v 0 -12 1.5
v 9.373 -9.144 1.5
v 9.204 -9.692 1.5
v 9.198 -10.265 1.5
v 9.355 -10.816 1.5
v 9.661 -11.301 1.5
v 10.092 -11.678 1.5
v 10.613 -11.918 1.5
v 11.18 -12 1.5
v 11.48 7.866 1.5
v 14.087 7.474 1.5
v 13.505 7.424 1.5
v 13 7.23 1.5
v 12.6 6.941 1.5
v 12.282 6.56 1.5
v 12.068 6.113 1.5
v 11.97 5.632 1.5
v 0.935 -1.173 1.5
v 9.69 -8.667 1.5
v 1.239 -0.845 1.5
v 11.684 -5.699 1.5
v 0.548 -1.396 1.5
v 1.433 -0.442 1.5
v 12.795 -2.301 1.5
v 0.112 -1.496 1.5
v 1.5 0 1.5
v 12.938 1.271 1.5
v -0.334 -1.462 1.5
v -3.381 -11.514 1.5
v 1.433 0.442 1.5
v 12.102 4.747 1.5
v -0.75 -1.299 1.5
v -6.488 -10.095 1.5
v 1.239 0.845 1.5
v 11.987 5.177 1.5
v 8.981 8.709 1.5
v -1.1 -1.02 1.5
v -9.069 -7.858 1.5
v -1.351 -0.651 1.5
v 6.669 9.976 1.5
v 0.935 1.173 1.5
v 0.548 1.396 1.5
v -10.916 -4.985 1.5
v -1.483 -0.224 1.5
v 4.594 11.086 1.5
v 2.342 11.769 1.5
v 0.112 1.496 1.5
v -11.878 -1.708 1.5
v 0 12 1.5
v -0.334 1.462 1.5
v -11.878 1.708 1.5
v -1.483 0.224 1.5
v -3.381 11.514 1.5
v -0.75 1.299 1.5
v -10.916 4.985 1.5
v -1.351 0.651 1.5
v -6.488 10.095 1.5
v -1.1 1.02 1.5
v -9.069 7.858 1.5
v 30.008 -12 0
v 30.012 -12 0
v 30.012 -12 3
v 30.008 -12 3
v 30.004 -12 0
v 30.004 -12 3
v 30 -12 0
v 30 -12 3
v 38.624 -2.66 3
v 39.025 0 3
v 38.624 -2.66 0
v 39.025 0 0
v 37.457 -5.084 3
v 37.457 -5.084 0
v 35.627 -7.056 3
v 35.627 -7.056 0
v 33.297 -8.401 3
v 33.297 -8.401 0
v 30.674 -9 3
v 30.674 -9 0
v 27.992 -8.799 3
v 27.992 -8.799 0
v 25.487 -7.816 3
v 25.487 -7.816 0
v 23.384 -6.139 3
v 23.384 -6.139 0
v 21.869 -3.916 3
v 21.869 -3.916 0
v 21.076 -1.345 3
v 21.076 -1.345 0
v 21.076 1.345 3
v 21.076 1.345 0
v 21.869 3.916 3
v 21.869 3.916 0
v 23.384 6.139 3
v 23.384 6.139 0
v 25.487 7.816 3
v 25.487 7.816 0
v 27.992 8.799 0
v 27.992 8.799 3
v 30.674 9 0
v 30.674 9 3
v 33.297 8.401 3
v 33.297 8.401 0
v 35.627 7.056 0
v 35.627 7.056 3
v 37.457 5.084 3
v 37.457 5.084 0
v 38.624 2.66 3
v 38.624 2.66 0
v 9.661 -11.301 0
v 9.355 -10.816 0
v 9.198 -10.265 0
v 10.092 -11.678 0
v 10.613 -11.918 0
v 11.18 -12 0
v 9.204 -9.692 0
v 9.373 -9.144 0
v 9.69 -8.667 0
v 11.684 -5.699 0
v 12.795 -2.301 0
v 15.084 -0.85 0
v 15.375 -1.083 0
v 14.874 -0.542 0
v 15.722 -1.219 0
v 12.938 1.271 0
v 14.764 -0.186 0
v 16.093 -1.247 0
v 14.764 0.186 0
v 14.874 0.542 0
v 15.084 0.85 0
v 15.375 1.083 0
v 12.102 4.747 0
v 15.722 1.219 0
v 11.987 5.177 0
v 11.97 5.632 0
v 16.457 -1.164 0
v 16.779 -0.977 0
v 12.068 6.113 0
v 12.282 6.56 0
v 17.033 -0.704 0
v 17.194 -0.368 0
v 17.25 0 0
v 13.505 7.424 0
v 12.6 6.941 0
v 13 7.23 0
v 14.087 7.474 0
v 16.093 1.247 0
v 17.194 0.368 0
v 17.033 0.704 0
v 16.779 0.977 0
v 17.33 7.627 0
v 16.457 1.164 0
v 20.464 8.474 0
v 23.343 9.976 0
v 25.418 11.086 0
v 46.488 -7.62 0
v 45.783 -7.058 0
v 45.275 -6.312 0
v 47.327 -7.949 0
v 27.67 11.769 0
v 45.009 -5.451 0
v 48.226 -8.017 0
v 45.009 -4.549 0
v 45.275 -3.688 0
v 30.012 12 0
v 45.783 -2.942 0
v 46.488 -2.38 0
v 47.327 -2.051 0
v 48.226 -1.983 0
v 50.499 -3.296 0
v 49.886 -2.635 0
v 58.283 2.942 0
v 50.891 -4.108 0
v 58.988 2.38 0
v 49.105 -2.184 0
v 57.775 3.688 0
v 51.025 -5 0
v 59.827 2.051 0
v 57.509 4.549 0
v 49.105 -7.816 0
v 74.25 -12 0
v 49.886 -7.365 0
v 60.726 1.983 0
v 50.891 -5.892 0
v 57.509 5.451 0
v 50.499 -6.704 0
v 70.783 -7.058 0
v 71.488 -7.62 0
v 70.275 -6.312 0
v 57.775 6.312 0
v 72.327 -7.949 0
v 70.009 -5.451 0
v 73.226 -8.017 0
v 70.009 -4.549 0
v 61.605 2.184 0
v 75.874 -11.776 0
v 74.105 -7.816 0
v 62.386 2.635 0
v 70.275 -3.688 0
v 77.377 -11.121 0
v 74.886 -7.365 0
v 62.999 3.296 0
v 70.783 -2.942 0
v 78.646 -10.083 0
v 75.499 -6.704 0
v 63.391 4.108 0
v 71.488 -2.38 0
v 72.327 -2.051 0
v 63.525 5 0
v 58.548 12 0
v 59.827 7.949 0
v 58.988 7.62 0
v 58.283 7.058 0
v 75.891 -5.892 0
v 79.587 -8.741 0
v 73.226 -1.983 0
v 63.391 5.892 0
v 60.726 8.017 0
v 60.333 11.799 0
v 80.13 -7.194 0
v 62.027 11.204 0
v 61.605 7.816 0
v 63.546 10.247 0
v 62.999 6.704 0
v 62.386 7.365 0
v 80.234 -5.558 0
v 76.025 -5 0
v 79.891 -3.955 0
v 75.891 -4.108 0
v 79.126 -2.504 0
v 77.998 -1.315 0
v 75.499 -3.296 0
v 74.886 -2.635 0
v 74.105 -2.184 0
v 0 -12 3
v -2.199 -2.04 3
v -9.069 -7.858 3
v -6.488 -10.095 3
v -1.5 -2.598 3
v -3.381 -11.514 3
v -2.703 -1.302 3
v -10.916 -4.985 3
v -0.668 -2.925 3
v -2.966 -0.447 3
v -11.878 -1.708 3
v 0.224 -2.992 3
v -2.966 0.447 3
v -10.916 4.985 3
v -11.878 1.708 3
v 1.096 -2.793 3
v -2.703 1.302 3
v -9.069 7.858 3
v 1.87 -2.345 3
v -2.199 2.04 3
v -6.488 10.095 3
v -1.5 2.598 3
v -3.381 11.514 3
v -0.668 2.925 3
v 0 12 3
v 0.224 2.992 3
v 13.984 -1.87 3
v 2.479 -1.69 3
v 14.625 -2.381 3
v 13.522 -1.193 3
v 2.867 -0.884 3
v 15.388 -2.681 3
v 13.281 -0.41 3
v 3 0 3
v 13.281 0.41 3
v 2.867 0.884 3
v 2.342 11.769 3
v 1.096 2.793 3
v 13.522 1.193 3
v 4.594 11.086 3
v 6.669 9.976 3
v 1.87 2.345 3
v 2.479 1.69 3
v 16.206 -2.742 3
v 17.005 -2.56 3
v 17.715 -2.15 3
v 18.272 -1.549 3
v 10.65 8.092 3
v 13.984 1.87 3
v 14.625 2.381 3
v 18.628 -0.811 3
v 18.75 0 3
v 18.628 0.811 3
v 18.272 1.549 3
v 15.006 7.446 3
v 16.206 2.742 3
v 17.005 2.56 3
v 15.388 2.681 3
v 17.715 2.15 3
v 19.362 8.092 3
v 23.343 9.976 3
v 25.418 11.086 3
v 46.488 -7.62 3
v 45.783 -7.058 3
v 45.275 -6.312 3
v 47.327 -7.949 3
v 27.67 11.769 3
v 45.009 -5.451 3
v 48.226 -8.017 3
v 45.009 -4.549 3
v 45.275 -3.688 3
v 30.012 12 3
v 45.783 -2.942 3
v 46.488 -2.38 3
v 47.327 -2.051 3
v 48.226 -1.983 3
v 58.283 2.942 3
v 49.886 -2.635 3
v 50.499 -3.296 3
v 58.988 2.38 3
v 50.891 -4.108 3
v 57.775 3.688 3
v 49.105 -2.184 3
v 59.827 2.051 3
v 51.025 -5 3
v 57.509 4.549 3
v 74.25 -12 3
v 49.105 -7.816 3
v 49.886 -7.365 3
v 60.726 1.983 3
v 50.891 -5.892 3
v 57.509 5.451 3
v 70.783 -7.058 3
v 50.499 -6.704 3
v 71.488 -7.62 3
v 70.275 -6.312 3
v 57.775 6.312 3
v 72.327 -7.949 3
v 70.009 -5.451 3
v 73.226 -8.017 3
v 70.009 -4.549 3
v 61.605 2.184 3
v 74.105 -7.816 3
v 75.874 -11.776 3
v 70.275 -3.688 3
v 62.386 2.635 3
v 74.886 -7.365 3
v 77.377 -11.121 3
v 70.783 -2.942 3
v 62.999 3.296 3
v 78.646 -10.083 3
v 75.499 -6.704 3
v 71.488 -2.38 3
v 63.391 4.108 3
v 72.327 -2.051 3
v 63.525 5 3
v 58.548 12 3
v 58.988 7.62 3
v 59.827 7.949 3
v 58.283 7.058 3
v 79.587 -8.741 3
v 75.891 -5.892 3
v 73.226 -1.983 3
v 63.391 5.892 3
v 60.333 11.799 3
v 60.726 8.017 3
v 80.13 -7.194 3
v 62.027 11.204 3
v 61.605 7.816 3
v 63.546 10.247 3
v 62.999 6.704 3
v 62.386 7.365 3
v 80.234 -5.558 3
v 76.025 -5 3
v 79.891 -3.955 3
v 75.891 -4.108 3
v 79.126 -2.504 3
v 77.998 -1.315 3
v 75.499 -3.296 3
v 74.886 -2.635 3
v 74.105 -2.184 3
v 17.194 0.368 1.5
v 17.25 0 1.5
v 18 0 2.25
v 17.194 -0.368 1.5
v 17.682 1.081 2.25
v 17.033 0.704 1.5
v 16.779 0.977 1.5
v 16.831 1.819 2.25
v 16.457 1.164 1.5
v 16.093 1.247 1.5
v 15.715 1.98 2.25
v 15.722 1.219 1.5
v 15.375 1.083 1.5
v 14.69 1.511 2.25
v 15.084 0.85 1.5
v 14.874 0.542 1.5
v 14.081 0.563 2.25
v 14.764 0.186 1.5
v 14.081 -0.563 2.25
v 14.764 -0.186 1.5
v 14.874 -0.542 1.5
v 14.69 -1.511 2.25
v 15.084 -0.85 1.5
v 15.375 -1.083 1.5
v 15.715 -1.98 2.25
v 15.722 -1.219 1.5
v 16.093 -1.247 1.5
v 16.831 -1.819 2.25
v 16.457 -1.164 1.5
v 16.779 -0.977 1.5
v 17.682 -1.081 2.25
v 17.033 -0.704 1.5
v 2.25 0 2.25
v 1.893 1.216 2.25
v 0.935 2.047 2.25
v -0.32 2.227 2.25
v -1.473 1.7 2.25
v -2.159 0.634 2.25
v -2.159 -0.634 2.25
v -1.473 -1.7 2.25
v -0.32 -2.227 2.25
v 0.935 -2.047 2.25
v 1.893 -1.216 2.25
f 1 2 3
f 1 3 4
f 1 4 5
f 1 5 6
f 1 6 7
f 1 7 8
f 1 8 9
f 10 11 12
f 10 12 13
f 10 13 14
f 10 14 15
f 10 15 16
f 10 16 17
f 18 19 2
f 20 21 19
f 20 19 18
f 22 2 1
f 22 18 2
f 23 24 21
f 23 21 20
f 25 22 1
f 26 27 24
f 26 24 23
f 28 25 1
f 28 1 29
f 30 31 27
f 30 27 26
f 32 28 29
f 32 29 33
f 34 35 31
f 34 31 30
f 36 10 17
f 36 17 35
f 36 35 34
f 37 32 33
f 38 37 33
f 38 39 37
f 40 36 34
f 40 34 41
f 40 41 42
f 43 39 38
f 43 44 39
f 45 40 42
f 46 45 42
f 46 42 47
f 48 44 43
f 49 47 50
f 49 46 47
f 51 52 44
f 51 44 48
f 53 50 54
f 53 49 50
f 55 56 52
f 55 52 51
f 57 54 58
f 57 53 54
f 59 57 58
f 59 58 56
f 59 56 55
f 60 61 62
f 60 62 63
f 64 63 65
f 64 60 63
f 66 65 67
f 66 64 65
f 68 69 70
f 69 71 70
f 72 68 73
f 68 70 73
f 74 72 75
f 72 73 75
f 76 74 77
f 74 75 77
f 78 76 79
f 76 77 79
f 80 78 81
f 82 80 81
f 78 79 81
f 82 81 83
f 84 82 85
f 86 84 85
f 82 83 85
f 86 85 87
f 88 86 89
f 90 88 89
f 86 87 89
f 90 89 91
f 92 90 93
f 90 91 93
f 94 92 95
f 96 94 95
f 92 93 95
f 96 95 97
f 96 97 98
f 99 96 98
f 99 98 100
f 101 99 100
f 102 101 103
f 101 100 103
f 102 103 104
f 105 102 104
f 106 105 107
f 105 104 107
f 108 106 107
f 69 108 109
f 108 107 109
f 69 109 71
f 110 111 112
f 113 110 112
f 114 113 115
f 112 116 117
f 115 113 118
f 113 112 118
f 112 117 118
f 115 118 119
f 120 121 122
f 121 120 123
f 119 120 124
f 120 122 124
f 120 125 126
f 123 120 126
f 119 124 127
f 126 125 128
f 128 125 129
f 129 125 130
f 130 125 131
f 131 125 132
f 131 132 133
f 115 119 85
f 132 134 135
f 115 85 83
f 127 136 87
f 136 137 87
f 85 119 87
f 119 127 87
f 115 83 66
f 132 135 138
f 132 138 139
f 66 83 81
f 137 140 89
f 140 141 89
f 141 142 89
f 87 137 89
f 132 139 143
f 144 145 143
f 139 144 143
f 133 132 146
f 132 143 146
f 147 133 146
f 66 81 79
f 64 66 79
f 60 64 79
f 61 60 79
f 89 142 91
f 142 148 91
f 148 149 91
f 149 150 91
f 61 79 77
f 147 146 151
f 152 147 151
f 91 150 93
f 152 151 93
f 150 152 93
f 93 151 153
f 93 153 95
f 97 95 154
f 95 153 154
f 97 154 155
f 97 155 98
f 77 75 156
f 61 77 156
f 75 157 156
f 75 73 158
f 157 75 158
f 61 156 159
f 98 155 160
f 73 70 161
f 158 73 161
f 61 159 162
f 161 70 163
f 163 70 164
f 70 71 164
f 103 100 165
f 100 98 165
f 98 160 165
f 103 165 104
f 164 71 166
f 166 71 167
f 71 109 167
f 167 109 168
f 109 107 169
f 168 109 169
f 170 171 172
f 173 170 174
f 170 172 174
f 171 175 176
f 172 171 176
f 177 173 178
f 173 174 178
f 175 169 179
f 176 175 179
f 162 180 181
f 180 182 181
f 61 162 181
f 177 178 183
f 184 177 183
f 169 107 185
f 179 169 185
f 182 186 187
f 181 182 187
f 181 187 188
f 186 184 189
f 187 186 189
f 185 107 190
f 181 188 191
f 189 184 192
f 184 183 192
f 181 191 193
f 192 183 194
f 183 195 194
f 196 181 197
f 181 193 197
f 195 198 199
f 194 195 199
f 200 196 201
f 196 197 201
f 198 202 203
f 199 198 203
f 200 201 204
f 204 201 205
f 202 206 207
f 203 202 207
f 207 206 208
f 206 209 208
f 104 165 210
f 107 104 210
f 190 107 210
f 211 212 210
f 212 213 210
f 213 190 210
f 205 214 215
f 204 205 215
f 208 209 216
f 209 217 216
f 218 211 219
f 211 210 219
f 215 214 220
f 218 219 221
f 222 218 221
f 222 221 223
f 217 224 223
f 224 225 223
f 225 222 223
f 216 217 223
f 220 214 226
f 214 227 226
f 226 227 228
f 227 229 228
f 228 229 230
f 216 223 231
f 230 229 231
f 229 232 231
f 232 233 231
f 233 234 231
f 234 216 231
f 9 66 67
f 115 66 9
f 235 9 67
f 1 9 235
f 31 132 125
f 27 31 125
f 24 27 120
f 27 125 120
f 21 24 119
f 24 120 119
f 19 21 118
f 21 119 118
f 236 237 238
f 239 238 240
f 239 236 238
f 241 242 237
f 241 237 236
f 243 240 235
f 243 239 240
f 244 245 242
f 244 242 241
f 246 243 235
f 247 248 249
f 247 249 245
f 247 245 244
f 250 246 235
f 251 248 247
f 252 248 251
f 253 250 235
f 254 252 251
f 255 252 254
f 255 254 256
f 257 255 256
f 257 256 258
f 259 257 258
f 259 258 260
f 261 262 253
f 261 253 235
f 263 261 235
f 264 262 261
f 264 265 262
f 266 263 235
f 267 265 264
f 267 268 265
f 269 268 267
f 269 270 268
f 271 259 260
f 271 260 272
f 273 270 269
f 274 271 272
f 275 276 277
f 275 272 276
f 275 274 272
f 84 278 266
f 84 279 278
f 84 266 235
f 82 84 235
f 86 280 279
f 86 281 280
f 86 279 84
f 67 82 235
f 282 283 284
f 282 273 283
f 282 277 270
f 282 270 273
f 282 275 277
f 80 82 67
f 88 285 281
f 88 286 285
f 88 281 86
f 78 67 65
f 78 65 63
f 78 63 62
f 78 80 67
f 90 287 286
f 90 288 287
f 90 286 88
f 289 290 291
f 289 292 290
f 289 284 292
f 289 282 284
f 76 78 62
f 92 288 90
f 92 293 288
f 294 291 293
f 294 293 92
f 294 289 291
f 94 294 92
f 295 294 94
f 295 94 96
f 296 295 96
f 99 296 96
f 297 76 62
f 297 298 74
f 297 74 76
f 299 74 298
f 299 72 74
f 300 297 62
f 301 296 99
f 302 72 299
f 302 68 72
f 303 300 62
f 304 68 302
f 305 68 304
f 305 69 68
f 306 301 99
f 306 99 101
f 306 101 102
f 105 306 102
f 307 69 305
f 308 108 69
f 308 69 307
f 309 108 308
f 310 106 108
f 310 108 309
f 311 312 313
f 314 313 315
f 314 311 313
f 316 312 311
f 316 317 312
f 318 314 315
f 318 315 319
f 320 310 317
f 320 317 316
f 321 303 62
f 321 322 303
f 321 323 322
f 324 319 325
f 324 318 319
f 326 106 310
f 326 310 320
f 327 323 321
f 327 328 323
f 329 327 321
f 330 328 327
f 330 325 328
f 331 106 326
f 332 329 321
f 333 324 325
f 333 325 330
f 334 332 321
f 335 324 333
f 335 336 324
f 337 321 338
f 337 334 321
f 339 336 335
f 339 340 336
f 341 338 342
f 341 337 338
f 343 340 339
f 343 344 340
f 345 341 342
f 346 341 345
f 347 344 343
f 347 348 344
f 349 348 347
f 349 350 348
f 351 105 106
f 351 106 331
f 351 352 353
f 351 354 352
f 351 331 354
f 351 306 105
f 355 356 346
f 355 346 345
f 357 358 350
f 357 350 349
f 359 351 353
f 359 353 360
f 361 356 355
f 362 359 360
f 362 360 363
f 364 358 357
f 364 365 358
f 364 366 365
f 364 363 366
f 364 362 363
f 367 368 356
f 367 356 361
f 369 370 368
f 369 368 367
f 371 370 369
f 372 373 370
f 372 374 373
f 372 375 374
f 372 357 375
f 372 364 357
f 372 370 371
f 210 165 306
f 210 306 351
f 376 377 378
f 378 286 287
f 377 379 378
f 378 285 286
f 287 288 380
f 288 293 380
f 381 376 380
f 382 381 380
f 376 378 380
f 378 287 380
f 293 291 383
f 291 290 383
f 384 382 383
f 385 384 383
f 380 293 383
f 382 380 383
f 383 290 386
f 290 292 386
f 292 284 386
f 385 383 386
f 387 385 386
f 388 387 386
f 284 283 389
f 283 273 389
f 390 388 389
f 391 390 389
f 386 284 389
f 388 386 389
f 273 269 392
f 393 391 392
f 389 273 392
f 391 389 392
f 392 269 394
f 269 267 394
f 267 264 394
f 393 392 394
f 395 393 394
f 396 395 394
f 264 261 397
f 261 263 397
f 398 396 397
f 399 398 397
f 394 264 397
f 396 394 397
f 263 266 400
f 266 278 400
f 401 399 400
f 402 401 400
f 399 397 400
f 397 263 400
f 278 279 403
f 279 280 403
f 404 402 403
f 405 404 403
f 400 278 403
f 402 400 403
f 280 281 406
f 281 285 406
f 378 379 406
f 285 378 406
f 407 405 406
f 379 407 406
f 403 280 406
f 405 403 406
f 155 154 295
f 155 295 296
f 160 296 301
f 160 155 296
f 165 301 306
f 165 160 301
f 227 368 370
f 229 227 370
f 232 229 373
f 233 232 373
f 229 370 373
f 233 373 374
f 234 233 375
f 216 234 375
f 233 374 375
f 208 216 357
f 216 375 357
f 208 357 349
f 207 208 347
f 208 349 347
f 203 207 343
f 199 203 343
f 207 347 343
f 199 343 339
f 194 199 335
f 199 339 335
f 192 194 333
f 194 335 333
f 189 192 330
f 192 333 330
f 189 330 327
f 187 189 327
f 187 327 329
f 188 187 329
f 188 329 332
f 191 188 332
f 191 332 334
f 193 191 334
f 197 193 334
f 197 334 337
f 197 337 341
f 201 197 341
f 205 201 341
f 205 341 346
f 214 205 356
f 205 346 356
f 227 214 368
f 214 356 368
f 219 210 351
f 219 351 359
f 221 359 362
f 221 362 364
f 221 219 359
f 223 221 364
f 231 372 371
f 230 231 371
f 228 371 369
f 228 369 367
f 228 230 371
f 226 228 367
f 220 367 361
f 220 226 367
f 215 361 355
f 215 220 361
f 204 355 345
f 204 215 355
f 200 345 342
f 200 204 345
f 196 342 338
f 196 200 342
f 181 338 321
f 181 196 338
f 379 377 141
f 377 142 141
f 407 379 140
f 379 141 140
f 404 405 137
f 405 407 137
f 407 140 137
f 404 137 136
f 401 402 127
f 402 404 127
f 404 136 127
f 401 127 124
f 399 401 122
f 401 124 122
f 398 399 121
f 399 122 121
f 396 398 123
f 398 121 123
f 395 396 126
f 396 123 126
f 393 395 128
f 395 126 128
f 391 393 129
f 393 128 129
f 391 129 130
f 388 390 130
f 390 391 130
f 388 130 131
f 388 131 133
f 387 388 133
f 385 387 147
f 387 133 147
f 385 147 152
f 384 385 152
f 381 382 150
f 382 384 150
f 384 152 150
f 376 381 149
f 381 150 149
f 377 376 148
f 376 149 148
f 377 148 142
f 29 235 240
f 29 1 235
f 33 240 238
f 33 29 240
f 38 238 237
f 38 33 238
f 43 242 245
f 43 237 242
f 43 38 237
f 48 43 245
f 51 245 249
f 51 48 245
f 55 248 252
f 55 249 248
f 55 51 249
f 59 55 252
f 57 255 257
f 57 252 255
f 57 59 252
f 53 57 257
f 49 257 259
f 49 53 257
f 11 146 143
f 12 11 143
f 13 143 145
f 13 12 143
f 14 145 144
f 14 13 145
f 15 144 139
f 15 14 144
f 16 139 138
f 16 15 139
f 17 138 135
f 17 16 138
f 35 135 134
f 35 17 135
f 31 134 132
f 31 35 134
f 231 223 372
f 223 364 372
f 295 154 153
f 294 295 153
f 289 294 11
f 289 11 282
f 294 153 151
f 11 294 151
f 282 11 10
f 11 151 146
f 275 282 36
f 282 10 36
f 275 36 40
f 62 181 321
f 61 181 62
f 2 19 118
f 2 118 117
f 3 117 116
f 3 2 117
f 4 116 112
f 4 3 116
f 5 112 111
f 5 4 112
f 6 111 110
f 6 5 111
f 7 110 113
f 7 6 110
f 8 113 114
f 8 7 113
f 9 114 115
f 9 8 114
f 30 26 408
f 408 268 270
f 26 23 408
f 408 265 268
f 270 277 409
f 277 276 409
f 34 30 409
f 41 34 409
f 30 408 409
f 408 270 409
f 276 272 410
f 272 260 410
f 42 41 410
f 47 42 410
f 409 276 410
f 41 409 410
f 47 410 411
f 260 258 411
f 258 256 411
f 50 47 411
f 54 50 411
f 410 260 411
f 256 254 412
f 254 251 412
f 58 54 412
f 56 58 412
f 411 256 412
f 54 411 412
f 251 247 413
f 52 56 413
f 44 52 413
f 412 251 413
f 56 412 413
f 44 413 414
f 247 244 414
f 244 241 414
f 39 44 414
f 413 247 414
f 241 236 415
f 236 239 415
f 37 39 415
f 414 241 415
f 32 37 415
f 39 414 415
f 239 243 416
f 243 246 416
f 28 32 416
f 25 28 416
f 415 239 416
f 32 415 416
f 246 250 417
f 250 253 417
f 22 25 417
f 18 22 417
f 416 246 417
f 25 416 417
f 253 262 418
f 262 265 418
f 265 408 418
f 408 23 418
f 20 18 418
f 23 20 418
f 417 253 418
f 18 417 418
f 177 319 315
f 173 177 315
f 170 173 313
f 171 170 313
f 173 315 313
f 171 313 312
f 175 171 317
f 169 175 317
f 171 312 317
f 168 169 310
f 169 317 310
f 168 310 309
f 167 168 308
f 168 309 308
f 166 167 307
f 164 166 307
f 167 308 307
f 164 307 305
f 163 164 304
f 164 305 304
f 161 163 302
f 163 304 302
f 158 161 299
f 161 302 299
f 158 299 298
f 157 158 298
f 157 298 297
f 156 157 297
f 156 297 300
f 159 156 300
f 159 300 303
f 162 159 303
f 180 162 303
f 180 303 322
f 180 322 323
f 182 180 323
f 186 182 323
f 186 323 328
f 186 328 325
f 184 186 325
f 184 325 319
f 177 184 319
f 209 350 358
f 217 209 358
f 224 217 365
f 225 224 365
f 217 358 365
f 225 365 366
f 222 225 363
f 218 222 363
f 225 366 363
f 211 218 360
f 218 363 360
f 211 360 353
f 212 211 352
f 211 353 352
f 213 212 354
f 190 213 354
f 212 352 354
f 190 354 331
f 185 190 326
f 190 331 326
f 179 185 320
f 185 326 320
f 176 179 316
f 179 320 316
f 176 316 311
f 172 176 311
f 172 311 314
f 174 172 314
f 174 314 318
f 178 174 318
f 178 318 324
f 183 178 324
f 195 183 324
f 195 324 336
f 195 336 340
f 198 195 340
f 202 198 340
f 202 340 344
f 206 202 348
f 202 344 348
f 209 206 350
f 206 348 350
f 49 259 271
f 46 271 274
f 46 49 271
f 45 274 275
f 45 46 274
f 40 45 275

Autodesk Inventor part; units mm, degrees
ref_plane "YZ Plane" through (0, 0, 0) normal (1, 0, 0) x (0, 1, 0)
ref_plane "XZ Plane" through (0, 0, 0) normal (0, 1, 0) x (-1, 0, 0)
ref_plane "XY Plane" through (0, 0, 0) normal (0, 0, 1) x (1, 0, 0)
sketch "スケッチ1" plane through (0, 0, 0) normal (0, 0, 1) x (1, 0, 0)
  line L0 (0, 0) -> (30, 0) construction
  line L1 (0, 12) -> (30.0122, 12)
  line L2 (30, -12) -> (0, -12)
  arc A0 (0, 12) -> (0, -12) centre (0, 0) ccw
  arc A1 (30, -12) -> (30.0122, 12) centre (30, 0) ccw
  circle A2 centre (0, 0) radius 1.5
  circle A3 centre (30, 0) radius 9.025
  arc A4 (6.6694, 9.9759) -> (23.3428, 9.9759) centre (15.0061, 22.4459) ccw
  arc A5 (30.0122, 12) -> (30, -12) centre (30.0122, 0) ccw construction
  arc A6 (0, -12) -> (0, 12) centre (0, 0) ccw construction
  arc A7 (6.6694, 9.9759) -> (0, 12) centre (0, 0) ccw
  arc A8 (30.0122, 12) -> (23.3428, 9.9759) centre (30.0122, 0) ccw
  line L3 (30.0122, 12) -> (92.8308, 12)
  line L4 (92.8308, 12) -> (92.8308, -12)
  line L5 (92.8308, -12) -> (30.0122, -12)
  line L6 (30.0122, -12) -> (30.0122, 12)
  circle A9 centre (16, 0) radius 1.25
  point P0 (30.0122, -12)
  dimension "d0" = 30
  dimension "d1" = 12
  dimension "d2" = 3
  dimension "d3" = 18.05
  dimension "d6" = 15
  dimension "d11" = 2.5
  dimension "d12" = 16
extrude "押し出し1" add sketch "スケッチ1" along normal blind 3 contours A7 A4 A8 L6 A3 A1 L2 A0 | L3 L4 L5 A1 | A1 L6 A3
sketch "スケッチ2" plane through (0, 0, 0) normal (0, 0, -1) x (-1, 0, 0)
  arc A0 (-30.0122, -12) -> (-30, -12) centre (-30, 0) ccw projected
  line L0 (-92.8308, 12) -> (-30.0122, 12) projected
  line L1 (-92.8308, -12) -> (-92.8308, 12) projected
  line L2 (0, -12) -> (-30, -12) projected
  arc A1 (0, -12) -> (-6.6694, 9.9759) centre (0, 0) ccw projected
  arc A2 (-23.3428, 9.9759) -> (-6.6694, 9.9759) centre (-15.0061, 22.4459) ccw projected
  circle A3 centre (0, 0) radius 1.5 projected
  circle A4 centre (-30, 0) radius 9.025 projected
  arc A5 (-23.3428, 9.9759) -> (-6.6694, 9.9759) centre (-15.0061, 22.4459) ccw projected
  arc A6 (-6.6694, 9.9759) -> (0, -12) centre (0, 0) ccw
  arc A7 (-7.8, 10.4) -> (0, -13) centre (0, 0) ccw
  line L3 (-30.0122, -12) -> (-92.8308, -12) projected
  arc A8 (-23.3428, 9.9759) -> (-30.0122, 12) centre (-30.0122, 0) ccw projected
  point P0 (-9.9986, 8.3083)
  point P1 (-5, -12)
  point P2 (-10.0009, 8.3056)
  dimension "d7" = 1
extrude "押し出し2" cut sketch "スケッチ2" against normal blind 1.5 contours A7 A2 A6 L2 | A6 A1
fillet "フィレット1" radius 2 2 edges at (10.0009, 8.3056, 0.75) (5, -12, 0.75)
sketch "スケッチ3" plane through (0, 0, 3) normal (0, 0, 1) x (1, 0, 0)
  line L0 (92.8308, 12) -> (30.0122, 12) projected
  arc A0 (30.0122, 12) -> (23.3428, 9.9759) centre (30.0122, 0) ccw projected
  arc A1 (6.6694, 9.9759) -> (23.3428, 9.9759) centre (15.0061, 22.4459) ccw projected
  arc A2 (6.6694, 9.9759) -> (0, -12) centre (0, 0) ccw projected
  line L1 (0, -12) -> (30, -12) projected
  arc A3 (30, -12) -> (30.0122, -12) centre (30, 0) ccw projected
  line L2 (30.0122, -12) -> (92.8308, -12) projected
  line L3 (92.8308, -12) -> (92.8308, 12) projected
  circle A4 centre (30, 0) radius 9.025 projected
  circle A5 centre (0, 0) radius 1.5 projected
  circle A6 centre (16, 0) radius 1.25 projected
  circle A7 centre (48, -5) radius 3.025
  circle A8 centre (73, -5) radius 3.025
  circle A9 centre (60.5, 5) radius 3.025
  line L4 (48, -5) -> (73, -5) construction
  line L5 (92.8308, 12) -> (30.0122, 12) projected
  line L6 (61.3547, 12) -> (92.8308, -13.1809)
  line L7 (92.8308, -12) -> (92.8308, 12) projected
  line L8 (60.5, 5) -> (73, -5) construction
  line L9 (60.5, 5) -> (60.5, -5) construction
  point P0 (60.5, 0)
  point P1 (91.3547, -12)
  dimension "d13" = 6.05
  dimension "d14" = 6.05
  dimension "d15" = 6.05
  dimension "d16" = 25
  dimension "d17" = 10
  dimension "d18" = 18
  dimension "d19" = 6
extrude "押し出し3" cut sketch "スケッチ3" against normal blind 10 contours L3 L2 L6 L0 | A7 | A8 | A9
fillet "フィレット2" radius 8 1 edges at (61.3547, 12, 1.5)
fillet "フィレット3" radius 6 1 edges at (91.3547, -12, 1.5)
chamfer "面取り1" distance 1.5 angle 45 2 edges at (-1.5, 0, 3) (14.75, 0, 3)
properties part number "揺動節左"
